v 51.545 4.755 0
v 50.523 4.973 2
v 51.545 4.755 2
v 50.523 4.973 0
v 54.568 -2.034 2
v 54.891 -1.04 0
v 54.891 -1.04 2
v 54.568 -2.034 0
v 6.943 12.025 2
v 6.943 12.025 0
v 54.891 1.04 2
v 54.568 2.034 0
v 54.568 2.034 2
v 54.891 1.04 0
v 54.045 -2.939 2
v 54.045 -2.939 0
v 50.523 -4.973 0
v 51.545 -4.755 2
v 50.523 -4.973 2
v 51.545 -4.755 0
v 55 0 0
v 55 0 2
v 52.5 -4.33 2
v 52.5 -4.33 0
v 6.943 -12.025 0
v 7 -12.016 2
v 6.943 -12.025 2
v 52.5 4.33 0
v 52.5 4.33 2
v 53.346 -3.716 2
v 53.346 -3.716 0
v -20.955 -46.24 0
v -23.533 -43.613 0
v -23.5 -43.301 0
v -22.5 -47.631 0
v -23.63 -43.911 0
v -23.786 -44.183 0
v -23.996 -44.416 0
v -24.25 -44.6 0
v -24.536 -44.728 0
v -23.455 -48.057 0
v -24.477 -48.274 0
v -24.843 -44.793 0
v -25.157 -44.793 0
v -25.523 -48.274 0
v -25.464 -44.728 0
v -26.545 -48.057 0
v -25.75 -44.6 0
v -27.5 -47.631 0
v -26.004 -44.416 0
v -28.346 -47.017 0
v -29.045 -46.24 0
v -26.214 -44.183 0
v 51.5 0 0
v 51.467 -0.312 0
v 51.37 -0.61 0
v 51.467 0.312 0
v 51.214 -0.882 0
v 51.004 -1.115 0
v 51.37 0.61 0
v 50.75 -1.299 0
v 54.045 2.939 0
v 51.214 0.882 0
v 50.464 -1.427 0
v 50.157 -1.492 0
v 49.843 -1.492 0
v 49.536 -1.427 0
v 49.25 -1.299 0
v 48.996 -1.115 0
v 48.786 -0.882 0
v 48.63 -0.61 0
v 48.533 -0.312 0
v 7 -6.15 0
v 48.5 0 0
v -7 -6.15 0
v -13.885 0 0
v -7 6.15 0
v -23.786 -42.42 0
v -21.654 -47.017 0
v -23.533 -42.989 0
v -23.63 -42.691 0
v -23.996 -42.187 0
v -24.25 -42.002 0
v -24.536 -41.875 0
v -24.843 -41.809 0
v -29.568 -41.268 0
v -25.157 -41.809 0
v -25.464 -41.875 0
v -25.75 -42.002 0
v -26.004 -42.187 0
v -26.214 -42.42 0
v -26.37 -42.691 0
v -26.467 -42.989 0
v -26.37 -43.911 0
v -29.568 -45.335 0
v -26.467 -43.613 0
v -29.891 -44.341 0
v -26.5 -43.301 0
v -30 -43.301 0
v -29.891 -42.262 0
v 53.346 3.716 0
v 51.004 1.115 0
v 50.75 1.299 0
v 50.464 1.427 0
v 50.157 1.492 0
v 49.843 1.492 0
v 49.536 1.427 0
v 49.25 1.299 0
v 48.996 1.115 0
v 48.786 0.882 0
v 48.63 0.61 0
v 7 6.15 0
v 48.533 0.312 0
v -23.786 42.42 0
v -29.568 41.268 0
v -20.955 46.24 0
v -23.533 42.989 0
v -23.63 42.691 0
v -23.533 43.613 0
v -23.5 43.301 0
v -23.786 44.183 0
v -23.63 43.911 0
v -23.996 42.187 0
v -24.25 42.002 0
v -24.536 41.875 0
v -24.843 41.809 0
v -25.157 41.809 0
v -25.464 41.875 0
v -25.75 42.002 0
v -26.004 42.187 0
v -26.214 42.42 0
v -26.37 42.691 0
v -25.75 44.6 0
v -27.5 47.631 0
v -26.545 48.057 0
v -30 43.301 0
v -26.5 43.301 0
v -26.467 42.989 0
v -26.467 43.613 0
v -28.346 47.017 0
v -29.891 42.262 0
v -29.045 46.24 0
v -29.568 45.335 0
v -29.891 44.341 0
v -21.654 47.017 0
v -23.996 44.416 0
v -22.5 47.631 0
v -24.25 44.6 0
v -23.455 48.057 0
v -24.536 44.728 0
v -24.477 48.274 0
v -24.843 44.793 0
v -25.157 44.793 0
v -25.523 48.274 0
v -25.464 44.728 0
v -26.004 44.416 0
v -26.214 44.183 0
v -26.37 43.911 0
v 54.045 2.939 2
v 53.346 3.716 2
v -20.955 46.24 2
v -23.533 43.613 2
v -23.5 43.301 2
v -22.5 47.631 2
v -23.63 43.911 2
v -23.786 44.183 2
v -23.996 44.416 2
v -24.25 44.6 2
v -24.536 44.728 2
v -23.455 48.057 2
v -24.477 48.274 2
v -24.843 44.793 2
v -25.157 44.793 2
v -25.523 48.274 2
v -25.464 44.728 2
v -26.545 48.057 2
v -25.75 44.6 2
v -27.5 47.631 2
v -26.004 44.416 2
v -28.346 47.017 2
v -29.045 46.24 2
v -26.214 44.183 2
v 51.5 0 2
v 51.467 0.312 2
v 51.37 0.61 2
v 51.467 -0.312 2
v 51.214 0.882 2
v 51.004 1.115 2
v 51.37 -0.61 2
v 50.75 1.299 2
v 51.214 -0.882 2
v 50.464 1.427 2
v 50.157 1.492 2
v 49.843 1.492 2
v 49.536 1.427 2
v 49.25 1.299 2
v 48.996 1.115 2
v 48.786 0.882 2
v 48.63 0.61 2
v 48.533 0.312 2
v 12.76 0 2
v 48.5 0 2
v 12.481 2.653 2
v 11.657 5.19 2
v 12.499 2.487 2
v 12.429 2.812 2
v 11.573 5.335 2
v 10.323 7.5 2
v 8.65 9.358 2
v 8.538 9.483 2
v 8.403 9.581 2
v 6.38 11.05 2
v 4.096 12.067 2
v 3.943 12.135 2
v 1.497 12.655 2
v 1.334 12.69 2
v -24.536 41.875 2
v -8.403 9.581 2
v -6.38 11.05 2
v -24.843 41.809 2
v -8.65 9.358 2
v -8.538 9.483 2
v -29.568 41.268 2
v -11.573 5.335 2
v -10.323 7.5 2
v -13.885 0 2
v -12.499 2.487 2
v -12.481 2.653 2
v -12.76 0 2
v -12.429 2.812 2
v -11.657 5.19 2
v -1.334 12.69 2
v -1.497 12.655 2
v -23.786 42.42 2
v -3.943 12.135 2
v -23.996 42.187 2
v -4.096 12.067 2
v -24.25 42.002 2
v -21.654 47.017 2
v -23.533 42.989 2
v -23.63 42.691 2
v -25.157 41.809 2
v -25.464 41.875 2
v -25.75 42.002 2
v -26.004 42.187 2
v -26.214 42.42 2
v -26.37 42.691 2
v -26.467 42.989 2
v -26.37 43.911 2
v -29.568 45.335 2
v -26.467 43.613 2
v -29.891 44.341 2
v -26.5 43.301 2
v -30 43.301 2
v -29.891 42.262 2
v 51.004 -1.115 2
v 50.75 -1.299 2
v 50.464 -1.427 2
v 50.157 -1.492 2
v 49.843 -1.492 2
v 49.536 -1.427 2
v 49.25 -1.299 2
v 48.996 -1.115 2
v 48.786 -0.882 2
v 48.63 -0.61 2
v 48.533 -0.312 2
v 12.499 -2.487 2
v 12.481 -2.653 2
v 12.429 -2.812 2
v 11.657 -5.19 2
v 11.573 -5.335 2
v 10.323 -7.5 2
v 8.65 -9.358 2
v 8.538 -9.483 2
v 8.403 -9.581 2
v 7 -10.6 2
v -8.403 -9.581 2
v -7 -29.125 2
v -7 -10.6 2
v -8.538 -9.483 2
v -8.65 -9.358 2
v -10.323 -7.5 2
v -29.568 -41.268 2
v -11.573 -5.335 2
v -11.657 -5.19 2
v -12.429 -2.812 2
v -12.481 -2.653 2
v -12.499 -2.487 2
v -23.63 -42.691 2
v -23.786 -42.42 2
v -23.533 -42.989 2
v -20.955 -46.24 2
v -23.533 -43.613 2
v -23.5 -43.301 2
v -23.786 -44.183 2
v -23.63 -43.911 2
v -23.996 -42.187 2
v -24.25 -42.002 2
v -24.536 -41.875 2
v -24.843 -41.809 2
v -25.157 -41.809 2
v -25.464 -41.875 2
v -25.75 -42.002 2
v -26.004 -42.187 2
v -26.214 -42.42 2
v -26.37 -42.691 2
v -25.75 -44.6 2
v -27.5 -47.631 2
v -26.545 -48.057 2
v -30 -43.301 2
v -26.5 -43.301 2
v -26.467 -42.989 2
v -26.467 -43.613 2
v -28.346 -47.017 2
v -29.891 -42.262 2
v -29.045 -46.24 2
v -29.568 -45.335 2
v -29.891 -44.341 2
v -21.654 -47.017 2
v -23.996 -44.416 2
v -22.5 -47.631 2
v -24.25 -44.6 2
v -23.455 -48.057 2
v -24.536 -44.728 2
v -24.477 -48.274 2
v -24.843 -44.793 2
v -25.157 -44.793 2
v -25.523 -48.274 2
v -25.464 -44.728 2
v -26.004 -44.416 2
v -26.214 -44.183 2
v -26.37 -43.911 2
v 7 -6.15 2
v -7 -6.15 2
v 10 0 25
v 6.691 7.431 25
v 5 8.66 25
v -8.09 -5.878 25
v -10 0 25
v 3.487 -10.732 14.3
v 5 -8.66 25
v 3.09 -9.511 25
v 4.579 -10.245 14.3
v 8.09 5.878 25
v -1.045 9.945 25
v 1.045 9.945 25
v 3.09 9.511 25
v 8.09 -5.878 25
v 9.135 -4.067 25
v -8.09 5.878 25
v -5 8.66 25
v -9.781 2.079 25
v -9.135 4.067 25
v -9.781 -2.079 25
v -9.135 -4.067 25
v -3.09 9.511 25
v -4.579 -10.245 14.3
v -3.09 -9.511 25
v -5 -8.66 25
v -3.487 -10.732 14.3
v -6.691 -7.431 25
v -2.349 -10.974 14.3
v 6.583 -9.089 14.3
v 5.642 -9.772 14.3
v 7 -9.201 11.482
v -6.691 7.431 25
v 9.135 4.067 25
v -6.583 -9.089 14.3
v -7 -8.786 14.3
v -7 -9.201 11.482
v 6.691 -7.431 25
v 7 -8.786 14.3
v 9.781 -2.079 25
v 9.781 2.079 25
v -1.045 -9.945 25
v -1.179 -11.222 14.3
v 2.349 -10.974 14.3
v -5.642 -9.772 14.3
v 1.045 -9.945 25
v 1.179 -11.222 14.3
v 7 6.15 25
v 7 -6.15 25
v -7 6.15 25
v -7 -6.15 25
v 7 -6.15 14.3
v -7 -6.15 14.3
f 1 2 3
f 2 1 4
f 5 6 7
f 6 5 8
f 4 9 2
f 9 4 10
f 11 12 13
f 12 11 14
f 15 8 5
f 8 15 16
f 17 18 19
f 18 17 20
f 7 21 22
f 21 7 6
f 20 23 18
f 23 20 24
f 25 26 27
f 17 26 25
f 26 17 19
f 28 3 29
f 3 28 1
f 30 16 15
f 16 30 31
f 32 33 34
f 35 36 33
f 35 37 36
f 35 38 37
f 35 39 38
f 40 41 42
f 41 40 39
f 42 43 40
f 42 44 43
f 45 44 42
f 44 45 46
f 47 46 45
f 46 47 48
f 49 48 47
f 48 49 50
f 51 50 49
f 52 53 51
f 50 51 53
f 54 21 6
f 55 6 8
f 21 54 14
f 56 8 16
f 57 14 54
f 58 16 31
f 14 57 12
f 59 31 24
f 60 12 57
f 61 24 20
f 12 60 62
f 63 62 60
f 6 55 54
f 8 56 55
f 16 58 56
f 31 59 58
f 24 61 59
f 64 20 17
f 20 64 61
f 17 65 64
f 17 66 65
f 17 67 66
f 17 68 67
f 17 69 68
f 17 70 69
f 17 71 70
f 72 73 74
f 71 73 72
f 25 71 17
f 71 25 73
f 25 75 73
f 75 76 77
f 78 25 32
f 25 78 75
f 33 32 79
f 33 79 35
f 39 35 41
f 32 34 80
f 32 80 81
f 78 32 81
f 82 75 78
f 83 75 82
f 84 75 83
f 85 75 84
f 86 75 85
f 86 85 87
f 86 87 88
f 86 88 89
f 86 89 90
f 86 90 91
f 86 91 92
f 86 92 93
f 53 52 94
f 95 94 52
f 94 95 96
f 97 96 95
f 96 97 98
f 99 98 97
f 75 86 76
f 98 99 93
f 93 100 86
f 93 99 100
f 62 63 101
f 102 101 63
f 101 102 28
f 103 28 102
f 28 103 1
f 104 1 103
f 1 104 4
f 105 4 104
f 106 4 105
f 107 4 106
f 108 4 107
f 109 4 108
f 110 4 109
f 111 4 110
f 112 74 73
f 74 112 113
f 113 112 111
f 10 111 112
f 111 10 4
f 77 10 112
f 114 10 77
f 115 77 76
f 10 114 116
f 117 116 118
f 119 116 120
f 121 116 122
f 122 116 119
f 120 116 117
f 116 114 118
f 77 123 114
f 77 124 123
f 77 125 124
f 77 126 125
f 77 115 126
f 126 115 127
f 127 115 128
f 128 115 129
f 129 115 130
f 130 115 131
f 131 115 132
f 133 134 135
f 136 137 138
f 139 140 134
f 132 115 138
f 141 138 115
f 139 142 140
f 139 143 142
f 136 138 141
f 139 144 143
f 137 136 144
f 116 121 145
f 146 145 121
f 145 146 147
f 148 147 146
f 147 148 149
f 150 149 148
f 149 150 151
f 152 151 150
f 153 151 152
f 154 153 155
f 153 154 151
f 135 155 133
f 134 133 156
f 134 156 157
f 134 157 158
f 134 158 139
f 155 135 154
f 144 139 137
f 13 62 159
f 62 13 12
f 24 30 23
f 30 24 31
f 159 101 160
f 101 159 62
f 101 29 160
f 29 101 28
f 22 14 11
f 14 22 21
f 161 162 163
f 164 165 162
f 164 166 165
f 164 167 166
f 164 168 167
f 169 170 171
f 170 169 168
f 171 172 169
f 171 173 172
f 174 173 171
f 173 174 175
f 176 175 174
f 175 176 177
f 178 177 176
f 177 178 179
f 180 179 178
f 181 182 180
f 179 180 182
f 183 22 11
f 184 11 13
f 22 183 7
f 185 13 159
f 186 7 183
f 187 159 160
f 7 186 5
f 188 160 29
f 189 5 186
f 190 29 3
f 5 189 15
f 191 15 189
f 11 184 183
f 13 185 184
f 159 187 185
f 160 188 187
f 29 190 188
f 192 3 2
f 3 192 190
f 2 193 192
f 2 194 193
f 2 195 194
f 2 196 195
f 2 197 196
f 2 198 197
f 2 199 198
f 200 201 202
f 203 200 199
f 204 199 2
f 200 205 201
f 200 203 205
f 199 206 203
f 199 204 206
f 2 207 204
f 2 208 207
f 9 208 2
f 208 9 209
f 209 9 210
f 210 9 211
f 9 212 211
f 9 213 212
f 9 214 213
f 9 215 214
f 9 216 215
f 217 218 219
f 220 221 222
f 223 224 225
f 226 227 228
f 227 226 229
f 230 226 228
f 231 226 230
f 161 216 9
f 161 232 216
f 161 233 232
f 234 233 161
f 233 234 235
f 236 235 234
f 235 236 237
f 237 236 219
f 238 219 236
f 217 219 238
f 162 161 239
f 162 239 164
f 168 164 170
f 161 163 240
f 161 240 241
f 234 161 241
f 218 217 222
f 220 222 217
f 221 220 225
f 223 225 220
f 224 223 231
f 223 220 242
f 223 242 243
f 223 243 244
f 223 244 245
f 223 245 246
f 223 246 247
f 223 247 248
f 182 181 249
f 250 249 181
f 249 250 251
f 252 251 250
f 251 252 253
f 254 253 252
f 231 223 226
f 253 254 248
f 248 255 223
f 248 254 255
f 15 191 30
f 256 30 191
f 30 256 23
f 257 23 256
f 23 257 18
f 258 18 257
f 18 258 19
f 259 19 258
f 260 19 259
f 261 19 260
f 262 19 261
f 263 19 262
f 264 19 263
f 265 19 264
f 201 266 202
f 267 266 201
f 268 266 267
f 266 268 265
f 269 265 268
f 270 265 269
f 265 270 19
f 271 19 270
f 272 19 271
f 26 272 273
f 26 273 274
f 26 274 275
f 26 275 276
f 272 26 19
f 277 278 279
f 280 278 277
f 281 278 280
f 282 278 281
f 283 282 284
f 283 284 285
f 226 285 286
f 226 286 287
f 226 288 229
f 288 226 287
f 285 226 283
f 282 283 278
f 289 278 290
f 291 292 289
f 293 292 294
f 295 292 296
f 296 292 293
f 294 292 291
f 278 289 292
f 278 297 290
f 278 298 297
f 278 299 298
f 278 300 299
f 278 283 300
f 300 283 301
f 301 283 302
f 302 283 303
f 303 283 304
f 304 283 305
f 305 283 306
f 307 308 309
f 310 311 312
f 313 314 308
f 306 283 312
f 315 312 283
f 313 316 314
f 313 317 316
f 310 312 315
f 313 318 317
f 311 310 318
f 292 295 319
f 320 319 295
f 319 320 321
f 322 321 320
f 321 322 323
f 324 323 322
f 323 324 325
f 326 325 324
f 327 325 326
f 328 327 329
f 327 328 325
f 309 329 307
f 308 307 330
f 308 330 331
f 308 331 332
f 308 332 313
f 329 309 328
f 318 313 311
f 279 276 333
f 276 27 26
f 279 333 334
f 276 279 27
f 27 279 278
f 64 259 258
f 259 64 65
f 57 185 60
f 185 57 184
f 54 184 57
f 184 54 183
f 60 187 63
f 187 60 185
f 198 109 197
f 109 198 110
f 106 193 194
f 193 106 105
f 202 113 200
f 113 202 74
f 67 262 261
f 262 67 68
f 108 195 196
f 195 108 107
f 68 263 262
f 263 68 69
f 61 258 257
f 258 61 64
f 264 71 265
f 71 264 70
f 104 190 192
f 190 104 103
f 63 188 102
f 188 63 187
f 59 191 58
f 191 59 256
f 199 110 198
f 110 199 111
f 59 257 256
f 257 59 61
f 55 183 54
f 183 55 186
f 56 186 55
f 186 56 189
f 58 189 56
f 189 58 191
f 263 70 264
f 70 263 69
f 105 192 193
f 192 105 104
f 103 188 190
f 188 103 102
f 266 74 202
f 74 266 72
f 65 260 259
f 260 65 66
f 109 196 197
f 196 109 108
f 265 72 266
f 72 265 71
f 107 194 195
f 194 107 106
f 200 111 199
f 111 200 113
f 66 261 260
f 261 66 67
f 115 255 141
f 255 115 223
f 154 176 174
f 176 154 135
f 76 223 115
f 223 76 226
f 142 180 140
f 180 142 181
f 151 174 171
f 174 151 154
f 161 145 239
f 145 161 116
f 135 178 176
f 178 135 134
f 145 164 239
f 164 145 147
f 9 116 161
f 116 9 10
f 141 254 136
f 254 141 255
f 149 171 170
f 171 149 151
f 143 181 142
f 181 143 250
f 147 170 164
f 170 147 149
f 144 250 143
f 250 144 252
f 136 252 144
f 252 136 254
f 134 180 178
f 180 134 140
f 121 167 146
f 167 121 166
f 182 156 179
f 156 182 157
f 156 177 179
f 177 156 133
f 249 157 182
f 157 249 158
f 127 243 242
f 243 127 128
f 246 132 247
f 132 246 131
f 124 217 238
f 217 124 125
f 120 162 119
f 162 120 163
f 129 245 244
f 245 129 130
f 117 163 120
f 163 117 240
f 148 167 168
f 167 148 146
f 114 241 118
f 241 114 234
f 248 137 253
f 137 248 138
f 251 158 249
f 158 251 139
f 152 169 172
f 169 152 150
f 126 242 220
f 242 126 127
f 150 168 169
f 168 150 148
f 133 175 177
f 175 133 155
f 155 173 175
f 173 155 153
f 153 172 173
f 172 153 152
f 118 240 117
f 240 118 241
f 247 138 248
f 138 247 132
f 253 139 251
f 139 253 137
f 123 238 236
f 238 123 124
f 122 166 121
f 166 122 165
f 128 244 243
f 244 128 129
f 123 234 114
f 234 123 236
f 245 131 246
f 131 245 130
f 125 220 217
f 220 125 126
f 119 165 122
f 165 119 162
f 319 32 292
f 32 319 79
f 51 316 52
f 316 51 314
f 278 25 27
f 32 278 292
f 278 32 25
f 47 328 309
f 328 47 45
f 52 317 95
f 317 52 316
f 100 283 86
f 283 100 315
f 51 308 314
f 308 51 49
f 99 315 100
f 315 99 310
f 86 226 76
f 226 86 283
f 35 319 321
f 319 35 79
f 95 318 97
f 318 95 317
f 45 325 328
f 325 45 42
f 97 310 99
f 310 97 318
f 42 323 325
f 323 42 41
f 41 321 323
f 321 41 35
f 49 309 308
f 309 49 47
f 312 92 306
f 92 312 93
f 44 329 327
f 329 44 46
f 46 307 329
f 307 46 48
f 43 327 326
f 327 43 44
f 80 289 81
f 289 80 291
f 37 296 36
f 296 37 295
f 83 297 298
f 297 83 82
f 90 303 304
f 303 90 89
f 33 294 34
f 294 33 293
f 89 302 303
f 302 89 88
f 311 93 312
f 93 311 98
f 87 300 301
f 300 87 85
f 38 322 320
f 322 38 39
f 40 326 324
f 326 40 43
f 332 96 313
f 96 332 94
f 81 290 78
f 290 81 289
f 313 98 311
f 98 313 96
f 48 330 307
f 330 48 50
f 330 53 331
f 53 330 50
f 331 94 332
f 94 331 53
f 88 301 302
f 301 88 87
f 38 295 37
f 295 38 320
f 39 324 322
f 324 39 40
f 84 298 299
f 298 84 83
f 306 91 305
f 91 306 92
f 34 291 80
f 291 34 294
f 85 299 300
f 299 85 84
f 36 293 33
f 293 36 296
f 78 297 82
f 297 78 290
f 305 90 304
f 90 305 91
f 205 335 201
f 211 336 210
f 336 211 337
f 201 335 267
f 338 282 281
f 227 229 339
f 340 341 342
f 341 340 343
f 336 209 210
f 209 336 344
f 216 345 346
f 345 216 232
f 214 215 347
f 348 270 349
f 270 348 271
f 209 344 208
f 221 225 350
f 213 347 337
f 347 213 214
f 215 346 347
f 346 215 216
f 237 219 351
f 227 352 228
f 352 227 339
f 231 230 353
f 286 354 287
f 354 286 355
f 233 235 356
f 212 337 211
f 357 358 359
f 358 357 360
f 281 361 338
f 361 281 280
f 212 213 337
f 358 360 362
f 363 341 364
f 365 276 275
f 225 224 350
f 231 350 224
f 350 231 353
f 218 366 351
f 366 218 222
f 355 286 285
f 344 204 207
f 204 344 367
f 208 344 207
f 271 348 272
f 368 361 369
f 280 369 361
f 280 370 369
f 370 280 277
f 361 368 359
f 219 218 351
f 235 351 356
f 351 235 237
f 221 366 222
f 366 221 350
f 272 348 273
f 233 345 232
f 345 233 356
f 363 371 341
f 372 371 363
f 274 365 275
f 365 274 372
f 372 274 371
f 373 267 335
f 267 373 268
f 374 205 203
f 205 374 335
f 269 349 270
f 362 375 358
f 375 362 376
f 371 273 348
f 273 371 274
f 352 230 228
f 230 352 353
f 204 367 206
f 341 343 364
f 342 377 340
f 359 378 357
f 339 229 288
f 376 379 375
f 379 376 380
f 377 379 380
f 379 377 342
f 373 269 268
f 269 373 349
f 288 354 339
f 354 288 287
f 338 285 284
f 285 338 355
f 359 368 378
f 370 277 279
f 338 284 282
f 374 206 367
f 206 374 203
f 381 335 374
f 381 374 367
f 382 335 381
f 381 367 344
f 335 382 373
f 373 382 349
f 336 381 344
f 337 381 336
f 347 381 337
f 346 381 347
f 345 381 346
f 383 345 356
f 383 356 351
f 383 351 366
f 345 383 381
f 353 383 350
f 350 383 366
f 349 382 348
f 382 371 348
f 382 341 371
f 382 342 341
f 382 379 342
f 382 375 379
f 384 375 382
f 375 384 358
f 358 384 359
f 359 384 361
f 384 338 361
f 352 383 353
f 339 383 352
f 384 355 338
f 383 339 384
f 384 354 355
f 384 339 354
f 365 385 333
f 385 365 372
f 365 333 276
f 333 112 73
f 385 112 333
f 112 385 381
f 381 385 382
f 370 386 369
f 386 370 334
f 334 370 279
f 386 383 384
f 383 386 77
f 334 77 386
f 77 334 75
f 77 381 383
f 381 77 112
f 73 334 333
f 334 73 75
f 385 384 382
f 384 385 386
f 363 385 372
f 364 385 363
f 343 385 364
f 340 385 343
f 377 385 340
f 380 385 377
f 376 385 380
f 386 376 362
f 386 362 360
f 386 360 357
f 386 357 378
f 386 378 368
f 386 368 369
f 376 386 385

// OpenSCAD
//radius of cone bottom in mm.
base=[13,2,0];

//Size of bolt holes in mm.
holes=3;

//Number of feet on the base.
feet=3; 

//Distance in mm to from the center to the bolt holes.
range=50; 

//Resolution of 3D printer in mm.
$fs=0.2;

hole=[14,12.3,72];



 


difference(){
union(){
cylinder (r2=10,r1=base[0],h=25);
for (turn=[0:360/feet:359]){
  rotate([ 0,0,turn]){
   difference(){
	hull(){   
     cylinder (r=base[0],h=base[1]);
     translate ([range,0,0]) cylinder (r=5,h=base[1]);
    }
	translate ([range,0,-1]) #cylinder (r=holes/2,h=base[1]*2);
   }
  }
 }
}
translate([-hole[0]/2,-hole[1]/2,-0.1])
cube (hole);
translate([-hole[0]/2,-hole[1]/2,base[1]])
translate([0,1,0]) rotate([90,0,0]) cube (hole);
}


//translate([-hole[0]/2,-hole[1]/2,base[1]]) rotate([135,0,0]) #cube ([hole[0],hole[1],10]);
